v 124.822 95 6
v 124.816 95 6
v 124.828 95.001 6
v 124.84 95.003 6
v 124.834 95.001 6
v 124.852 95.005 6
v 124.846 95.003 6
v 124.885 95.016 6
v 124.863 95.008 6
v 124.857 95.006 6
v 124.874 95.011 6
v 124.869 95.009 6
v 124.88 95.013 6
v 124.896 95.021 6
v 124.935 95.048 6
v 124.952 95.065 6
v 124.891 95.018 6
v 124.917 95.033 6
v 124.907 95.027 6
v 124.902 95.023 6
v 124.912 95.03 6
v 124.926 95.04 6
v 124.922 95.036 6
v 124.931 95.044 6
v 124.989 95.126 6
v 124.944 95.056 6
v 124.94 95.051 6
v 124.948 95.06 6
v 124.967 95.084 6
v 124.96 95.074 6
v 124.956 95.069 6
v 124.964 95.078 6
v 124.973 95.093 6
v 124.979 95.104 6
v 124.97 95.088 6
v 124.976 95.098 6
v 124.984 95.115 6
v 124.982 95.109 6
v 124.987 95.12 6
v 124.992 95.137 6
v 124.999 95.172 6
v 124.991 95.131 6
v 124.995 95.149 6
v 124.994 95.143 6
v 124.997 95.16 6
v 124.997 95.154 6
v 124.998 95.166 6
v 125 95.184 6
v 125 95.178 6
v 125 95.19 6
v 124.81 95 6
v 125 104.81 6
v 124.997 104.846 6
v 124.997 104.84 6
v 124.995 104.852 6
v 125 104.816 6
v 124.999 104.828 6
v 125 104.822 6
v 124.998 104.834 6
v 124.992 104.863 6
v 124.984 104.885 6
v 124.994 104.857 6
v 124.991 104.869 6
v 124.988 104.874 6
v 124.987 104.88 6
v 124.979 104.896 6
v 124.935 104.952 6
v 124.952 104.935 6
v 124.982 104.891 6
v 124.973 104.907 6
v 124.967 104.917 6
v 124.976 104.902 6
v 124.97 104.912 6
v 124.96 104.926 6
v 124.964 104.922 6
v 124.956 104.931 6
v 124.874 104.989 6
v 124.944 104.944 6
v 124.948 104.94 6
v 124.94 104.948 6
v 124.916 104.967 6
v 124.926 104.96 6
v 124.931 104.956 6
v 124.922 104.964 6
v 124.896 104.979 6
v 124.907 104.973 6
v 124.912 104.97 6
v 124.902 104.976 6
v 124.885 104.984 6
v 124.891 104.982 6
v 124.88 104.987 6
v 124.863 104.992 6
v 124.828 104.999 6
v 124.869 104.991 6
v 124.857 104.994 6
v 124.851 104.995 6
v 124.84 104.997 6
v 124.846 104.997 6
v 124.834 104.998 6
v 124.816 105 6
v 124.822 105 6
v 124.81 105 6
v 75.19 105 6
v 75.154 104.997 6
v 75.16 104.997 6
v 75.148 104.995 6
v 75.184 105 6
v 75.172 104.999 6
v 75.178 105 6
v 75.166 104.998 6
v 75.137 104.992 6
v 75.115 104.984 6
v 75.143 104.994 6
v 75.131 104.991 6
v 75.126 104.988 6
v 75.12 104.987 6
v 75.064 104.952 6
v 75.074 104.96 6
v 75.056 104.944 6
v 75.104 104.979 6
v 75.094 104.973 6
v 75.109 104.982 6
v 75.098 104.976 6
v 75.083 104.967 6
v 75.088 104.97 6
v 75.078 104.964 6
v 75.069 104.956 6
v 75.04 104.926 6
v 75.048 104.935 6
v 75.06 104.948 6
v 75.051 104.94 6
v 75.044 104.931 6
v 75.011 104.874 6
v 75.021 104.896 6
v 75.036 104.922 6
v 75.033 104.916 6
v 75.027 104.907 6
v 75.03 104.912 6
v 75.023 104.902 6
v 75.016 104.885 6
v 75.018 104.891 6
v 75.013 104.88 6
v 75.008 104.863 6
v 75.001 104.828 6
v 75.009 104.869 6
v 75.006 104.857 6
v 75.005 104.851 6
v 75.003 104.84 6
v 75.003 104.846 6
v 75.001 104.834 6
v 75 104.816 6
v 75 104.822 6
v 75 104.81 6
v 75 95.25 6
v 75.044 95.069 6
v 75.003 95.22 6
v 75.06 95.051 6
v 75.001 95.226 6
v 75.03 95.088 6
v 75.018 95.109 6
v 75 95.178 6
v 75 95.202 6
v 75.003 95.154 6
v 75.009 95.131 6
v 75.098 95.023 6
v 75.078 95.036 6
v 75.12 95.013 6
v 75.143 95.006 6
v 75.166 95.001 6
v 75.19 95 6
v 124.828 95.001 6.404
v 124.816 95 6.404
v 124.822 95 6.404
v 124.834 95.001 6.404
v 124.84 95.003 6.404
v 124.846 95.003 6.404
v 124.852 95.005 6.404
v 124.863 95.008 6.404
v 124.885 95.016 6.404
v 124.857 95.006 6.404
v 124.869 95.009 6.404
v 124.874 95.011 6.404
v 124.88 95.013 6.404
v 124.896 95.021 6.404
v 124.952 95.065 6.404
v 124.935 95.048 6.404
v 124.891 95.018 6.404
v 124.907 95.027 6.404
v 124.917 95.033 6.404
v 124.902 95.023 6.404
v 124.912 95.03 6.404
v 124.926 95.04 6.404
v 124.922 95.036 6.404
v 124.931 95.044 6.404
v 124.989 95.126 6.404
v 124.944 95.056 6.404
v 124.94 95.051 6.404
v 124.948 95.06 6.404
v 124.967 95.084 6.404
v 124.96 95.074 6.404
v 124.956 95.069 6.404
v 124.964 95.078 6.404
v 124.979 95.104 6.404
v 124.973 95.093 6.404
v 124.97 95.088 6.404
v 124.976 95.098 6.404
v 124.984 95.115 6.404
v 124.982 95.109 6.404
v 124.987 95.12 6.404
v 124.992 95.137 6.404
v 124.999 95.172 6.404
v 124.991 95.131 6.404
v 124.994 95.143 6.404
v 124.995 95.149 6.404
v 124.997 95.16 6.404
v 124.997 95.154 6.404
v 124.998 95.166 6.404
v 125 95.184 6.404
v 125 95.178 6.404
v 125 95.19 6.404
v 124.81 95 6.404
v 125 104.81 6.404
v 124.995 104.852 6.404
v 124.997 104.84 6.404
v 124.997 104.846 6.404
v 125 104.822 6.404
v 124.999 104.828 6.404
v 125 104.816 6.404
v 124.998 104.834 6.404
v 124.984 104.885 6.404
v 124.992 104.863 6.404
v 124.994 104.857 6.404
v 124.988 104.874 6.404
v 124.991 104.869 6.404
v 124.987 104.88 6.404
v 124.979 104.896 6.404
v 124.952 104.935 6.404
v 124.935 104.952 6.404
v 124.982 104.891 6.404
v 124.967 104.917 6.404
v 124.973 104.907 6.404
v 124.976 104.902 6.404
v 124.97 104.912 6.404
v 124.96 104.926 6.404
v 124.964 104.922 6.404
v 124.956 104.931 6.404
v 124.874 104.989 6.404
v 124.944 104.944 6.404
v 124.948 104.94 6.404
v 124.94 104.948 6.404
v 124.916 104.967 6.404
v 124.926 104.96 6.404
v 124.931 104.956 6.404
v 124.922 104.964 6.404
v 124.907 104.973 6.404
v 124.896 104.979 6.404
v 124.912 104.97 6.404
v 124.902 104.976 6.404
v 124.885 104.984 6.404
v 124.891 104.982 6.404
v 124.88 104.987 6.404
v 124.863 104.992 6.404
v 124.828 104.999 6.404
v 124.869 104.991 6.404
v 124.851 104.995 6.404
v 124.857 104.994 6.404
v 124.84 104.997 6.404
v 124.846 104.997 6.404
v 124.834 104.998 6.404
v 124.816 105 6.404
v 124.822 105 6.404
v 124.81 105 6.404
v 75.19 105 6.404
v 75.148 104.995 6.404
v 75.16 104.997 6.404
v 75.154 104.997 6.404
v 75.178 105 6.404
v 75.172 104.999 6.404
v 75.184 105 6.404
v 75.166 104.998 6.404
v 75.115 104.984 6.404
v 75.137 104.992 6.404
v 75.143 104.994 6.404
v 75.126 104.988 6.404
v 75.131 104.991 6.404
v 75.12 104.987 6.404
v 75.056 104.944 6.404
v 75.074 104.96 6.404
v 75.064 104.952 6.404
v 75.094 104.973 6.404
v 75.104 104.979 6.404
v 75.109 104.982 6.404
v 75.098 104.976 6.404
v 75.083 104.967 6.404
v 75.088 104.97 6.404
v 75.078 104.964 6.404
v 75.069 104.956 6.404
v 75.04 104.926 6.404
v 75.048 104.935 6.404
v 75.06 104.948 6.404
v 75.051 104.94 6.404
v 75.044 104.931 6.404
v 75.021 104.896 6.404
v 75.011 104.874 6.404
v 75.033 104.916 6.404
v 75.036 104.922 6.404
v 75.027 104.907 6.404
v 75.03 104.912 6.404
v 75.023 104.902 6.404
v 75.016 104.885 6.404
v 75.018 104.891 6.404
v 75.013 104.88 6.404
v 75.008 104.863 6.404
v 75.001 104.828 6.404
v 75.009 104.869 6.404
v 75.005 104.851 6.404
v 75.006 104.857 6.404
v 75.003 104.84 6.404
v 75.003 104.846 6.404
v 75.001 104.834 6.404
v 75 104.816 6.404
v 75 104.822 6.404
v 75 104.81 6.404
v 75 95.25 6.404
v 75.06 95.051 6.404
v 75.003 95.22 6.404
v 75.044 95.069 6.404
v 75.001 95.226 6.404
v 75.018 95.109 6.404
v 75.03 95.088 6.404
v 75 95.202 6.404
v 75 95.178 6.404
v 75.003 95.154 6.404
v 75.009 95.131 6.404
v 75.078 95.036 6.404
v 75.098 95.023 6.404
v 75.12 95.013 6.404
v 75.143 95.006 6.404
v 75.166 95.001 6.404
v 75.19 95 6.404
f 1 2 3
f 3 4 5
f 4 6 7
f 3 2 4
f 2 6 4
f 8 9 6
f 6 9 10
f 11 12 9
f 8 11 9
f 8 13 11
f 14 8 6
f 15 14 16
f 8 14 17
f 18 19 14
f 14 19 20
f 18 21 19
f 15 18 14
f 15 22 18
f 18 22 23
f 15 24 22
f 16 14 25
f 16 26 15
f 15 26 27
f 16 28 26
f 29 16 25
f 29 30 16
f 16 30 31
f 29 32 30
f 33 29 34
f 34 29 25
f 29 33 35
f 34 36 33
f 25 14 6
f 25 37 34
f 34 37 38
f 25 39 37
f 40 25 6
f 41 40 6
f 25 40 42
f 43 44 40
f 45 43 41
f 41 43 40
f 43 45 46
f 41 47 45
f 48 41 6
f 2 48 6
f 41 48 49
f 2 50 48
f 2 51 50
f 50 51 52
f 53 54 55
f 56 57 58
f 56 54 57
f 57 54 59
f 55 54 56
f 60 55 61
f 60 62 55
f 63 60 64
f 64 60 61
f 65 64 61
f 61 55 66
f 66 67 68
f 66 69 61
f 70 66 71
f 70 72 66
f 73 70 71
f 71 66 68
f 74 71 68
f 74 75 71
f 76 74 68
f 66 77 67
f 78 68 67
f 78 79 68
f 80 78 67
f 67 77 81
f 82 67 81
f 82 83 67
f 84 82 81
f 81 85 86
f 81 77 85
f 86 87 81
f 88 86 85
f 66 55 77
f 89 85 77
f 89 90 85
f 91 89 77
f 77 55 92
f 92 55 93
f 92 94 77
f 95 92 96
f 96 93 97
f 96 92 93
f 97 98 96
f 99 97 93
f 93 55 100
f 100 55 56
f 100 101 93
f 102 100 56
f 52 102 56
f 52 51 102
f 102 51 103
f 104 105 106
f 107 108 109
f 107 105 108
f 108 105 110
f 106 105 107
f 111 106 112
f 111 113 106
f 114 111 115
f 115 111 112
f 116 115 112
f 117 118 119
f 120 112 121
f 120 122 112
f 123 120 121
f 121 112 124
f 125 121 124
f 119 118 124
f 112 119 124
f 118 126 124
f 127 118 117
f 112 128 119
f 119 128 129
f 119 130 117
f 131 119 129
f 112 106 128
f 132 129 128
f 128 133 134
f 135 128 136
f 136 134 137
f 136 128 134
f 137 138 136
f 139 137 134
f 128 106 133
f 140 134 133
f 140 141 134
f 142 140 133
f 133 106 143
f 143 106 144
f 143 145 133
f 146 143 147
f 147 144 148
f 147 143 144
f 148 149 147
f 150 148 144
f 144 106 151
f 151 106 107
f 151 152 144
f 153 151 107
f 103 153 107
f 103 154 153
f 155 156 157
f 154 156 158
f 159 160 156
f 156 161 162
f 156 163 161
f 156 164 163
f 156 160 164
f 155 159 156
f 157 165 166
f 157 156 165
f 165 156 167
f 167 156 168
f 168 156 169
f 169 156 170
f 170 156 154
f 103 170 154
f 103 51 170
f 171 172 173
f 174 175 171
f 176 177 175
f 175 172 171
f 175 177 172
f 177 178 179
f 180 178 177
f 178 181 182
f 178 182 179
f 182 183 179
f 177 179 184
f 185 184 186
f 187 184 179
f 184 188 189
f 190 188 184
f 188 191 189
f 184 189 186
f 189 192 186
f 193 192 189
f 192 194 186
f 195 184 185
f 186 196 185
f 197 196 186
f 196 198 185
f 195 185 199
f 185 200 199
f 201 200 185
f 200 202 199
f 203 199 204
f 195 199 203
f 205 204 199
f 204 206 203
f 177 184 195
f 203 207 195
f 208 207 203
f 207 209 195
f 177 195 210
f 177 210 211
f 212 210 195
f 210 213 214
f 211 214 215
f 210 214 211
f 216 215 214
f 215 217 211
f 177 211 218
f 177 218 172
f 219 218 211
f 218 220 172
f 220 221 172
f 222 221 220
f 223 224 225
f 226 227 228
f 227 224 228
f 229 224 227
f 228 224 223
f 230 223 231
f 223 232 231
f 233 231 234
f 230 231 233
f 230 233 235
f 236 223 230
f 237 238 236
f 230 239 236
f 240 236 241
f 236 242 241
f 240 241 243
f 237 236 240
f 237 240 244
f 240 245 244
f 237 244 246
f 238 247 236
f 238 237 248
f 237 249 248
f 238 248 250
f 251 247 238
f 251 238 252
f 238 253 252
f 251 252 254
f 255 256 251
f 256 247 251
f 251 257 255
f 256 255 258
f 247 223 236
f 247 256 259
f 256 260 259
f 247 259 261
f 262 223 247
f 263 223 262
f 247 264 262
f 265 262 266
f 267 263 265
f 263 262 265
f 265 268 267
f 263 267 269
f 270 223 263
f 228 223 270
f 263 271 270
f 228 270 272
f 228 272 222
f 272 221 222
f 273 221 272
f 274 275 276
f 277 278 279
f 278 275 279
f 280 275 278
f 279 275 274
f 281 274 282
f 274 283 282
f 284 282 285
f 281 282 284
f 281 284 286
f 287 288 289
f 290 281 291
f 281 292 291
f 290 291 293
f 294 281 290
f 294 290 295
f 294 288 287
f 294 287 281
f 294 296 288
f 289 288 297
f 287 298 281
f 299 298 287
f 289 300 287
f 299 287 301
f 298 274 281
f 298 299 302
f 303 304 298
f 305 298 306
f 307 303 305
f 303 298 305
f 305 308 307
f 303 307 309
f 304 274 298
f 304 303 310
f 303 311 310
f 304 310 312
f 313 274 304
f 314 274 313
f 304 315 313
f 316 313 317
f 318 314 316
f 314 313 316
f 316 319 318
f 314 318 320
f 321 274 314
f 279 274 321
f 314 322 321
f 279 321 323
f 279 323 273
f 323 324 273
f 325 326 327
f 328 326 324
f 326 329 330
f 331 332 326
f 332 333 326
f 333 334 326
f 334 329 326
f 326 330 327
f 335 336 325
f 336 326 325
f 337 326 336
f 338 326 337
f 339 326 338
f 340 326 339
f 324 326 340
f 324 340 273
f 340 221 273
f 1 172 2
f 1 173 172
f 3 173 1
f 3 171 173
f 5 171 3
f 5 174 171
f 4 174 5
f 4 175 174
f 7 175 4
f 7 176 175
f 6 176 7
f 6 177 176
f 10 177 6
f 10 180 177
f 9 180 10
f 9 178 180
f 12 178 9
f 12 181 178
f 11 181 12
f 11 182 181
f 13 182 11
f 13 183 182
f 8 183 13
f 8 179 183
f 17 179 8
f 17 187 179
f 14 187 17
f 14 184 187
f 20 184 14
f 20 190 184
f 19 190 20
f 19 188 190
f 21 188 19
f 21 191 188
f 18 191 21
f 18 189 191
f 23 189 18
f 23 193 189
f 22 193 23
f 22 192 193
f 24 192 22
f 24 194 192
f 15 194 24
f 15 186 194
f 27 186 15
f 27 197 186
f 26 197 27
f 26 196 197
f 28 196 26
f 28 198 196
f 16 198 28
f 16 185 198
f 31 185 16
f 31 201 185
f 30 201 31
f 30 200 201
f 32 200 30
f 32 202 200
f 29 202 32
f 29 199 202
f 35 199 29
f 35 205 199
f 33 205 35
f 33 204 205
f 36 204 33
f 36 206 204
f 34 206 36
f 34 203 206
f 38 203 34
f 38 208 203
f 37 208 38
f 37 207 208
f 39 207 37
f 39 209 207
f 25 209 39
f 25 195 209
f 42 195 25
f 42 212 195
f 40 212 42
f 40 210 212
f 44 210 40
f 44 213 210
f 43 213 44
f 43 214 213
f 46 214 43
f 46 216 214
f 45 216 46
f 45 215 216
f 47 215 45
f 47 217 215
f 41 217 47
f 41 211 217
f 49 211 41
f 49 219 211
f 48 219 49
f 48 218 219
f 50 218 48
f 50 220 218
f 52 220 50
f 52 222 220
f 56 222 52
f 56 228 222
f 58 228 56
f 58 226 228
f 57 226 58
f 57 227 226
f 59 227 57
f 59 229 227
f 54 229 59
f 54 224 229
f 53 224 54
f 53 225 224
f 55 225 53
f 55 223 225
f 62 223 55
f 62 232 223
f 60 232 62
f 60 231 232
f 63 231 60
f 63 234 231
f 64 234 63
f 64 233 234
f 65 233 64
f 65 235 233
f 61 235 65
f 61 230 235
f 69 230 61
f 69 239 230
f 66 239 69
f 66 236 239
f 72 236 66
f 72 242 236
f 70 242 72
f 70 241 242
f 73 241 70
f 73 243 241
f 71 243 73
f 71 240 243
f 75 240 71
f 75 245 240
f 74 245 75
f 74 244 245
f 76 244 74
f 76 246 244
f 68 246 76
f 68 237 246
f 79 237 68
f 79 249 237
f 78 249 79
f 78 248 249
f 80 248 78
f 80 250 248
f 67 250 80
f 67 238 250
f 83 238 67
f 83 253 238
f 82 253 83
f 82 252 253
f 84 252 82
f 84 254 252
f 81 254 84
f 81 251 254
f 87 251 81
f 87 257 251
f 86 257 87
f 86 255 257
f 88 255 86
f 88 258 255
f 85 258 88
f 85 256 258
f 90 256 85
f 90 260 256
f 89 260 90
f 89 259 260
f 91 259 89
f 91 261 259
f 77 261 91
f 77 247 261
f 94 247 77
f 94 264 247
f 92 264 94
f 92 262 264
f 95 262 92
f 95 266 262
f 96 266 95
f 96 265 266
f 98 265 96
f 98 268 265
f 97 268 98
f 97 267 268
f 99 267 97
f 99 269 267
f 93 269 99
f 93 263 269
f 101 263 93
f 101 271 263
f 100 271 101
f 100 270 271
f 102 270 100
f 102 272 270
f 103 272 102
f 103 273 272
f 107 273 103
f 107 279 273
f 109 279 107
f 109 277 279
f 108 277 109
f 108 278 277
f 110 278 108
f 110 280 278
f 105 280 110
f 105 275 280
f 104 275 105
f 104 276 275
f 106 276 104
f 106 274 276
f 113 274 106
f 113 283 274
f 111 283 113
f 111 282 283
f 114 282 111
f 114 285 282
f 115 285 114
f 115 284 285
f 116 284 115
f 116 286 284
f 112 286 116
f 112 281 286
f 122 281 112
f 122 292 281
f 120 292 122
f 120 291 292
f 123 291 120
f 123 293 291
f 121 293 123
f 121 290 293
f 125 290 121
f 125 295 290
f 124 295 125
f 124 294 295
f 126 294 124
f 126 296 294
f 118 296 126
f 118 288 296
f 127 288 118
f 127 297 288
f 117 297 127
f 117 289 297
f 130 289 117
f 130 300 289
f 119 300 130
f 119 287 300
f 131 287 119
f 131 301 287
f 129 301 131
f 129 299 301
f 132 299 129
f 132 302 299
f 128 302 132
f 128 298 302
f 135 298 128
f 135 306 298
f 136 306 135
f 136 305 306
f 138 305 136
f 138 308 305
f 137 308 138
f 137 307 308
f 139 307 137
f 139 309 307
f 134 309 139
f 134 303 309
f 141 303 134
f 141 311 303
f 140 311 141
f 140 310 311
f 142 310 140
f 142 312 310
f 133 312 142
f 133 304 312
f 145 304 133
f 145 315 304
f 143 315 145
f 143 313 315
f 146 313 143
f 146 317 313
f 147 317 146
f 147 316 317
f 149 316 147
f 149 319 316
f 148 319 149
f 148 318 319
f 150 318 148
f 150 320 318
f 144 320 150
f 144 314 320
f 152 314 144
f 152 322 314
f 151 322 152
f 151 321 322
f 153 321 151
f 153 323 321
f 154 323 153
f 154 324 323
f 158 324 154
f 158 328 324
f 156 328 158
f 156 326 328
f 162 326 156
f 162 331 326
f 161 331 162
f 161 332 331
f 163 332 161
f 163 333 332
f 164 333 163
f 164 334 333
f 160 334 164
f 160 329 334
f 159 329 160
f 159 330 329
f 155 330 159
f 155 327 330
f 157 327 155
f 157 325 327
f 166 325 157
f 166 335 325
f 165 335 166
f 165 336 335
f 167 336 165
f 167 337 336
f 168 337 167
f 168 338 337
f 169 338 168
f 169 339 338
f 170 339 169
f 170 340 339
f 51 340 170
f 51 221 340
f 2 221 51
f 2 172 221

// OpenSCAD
module drawBasicShape(x1, y1, x2, y2, width)
{
	length = sqrt((x1-x2)*(x1-x2) + (y1-y2)*(y1-y2));
	if (width!=0.0) {
		square(size = [width, length], center = false);
		translate([width/2.0, 0, 0]) circle(d=width);
		translate([width/2.0, length, 0]) circle(d=width);
	}
}

module translateAndRotate(x1, y1, x2, y2, width)
{
	if (width != 0.0) {
		angle = atan((y2-y1)/(x2-x1)) +270;
		if (x2>=x1) {
			translate([x1, y1, 0.0]) rotate([0.0, 0.0, angle]) translate([-width/2.0, 0.0, 0.0]) scale([1.0, 1.0, 1.0]) drawBasicShape(x1, y1, x2, y2, width);
		}
		else {
			translate([x1, y1, 0.0]) rotate([0.0, 0.0, angle+180]) translate([-width/2.0, 0.0, 0.0]) scale([1.0, 1.0, 1.0]) drawBasicShape(x1, y1, x2, y2, width);		}
	}
}

$fn=50;

points14 = [
[75.77800000, 95.77800000, 0.00000000],
[124.22200000, 95.77800000, 0.37999672],
[124.22200000, 104.22200000, 0.37997788],
[75.77800000, 104.22200000, 0.37999548],
[75.77800000, 95.83800000, 0.37998140],
[75.48400000, 95.48400000, 0.00000000],
[124.51600000, 95.48400000, 0.37999746],
[124.51600000, 104.51600000, 0.37998977],
[75.48400000, 104.51600000, 0.37999868],
[75.48400000, 95.54400000, 0.37998644],
[75.19000000, 95.19000000, 0.00000000],
[124.81000000, 95.19000000, 0.38000060],
[124.81000000, 104.81000000, 0.38000021],
[75.19000000, 104.81000000, 0.37999939],
[75.19000000, 95.25000000, 0.38000344],
[75.53600000, 95.39000000, 0.00000000],
[75.94600000, 103.88900000, 0.00000000],
[76.11100000, 104.05400000, 0.37935605],
[76.52800000, 104.05400000, 0.38015610],
[75.94600000, 103.47200000, 0.37989934],
[75.94600000, 103.05500000, 0.38001190],
[76.94500000, 104.05400000, 0.37994651],
[77.36200000, 104.05400000, 0.38015610],
[75.94600000, 102.63800000, 0.37996589],
[75.94600000, 102.22100000, 0.38015610],
[77.77900000, 104.05400000, 0.37999966],
[78.19600000, 104.05400000, 0.38001190],
[75.94600000, 101.80400000, 0.38000201],
[75.94600000, 101.38700000, 0.38015610],
[78.61300000, 104.05400000, 0.38000362],
[79.03000000, 104.05400000, 0.38001190],
[75.94600000, 100.97000000, 0.38003238],
[75.94600000, 100.55300000, 0.38001190],
[79.44700000, 104.05400000, 0.38001785],
[79.86400000, 104.05400000, 0.38001190],
[75.94600000, 100.13600000, 0.38002811],
[75.94600000, 99.71900000, 0.38001190],
[80.28100000, 104.05400000, 0.38002660],
[80.69800000, 104.05400000, 0.38015610],
[75.94600000, 99.30200000, 0.38002534],
[75.94600000, 98.88500000, 0.38001190],
[81.11500000, 104.05400000, 0.38003252],
[81.53300000, 104.05400000, 0.37930814],
[75.94600000, 98.46700000, 0.37997836],
[75.94600000, 98.05000000, 0.38001190],
[81.95000000, 104.05400000, 0.37998780],
[82.36700000, 104.05400000, 0.38001190],
[75.94600000, 97.63300000, 0.37998939],
[75.94600000, 97.21600000, 0.38001190],
[82.78400000, 104.05400000, 0.37999079],
[83.20100000, 104.05400000, 0.38001190],
[75.94600000, 96.79900000, 0.37999789],
[75.94600000, 96.38200000, 0.38001190],
[83.61800000, 104.05400000, 0.37999314],
[84.03500000, 104.05400000, 0.38015610],
[75.95600000, 95.97600000, 0.37999749],
[76.34400000, 95.94600000, 0.37973456],
[84.45200000, 104.05400000, 0.38000229],
[84.86900000, 104.05400000, 0.38001190],
[76.76100000, 95.94600000, 0.38000754],
[77.17800000, 95.94600000, 0.38001190],
[85.28600000, 104.05400000, 0.38000229],
[85.70300000, 104.05400000, 0.38001190],
[77.59500000, 95.94600000, 0.38000754],
[78.01200000, 95.94600000, 0.38001190],
[86.12000000, 104.05400000, 0.38000229],
[86.53700000, 104.05400000, 0.38015610],
[78.42900000, 95.94600000, 0.38000229],
[78.84600000, 95.94600000, 0.38001190],
[86.95400000, 104.05400000, 0.38000754],
[87.37100000, 104.05400000, 0.38001190],
[79.26300000, 95.94600000, 0.38000229],
[79.68000000, 95.94600000, 0.38001190],
[87.78900000, 104.05400000, 0.37998940],
[88.20600000, 104.05400000, 0.38001190],
[80.09700000, 95.94600000, 0.37998415],
[80.51500000, 95.94600000, 0.37945200],
[88.62300000, 104.05400000, 0.38000229],
[89.04000000, 104.05400000, 0.38001190],
[80.93200000, 95.94600000, 0.38000754],
[81.34900000, 95.94600000, 0.38001190],
[89.45700000, 104.05400000, 0.38000229],
[89.87400000, 104.05400000, 0.38001190],
[81.76600000, 95.94600000, 0.38000754],
[82.18300000, 95.94600000, 0.38001190],
[90.29100000, 104.05400000, 0.38000229],
[90.70800000, 104.05400000, 0.38015610],
[82.60000000, 95.94600000, 0.38000229],
[83.01700000, 95.94600000, 0.38001190],
[91.12500000, 104.05400000, 0.38000229],
[91.54200000, 104.05400000, 0.38015610],
[83.43400000, 95.94600000, 0.38000229],
[83.85100000, 95.94600000, 0.38001190],
[91.95900000, 104.05400000, 0.38000754],
[92.37600000, 104.05400000, 0.38001190],
[84.26800000, 95.94600000, 0.38000229],
[84.68500000, 95.94600000, 0.38001190],
[92.79300000, 104.05400000, 0.38000754],
[93.21000000, 104.05400000, 0.38001190],
[85.10200000, 95.94600000, 0.38000229],
[85.51900000, 95.94600000, 0.38015610],
[93.62700000, 104.05400000, 0.38000229],
[94.04400000, 104.05400000, 0.38001190],
[85.93600000, 95.94600000, 0.38000754],
[86.35300000, 95.94600000, 0.38001190],
[94.46200000, 104.05400000, 0.37998415],
[94.87900000, 104.05400000, 0.38001190],
[86.77000000, 95.94600000, 0.37998940],
[87.18800000, 95.94600000, 0.37930814],
[95.29600000, 104.05400000, 0.38000229],
[95.71300000, 104.05400000, 0.38015610],
[87.60500000, 95.94600000, 0.38000229],
[88.02200000, 95.94600000, 0.38001190],
[96.13000000, 104.05400000, 0.38000754],
[96.54700000, 104.05400000, 0.38001190],
[88.43900000, 95.94600000, 0.38000229],
[88.85600000, 95.94600000, 0.38001190],
[96.96400000, 104.05400000, 0.38000754],
[97.38100000, 104.05400000, 0.38001190],
[89.27300000, 95.94600000, 0.38000229],
[89.69000000, 95.94600000, 0.38015610],
[97.79800000, 104.05400000, 0.38000229],
[98.21500000, 104.05400000, 0.38001190],
[90.10700000, 95.94600000, 0.38000754],
[90.52400000, 95.94600000, 0.38001190],
[98.63200000, 104.05400000, 0.38000229],
[99.04900000, 104.05400000, 0.38001190],
[90.94100000, 95.94600000, 0.38000754],
[91.35800000, 95.94600000, 0.38001190],
[99.46600000, 104.05400000, 0.38000229],
[99.88300000, 104.05400000, 0.38015610],
[91.77500000, 95.94600000, 0.38000229],
[92.19200000, 95.94600000, 0.38001190],
[100.30000000, 104.05400000, 0.38000754],
[100.71800000, 104.05400000, 0.37930814],
[92.60900000, 95.94600000, 0.37998415],
[93.02600000, 95.94600000, 0.38001190],
[101.13500000, 104.05400000, 0.37998940],
[101.55200000, 104.05400000, 0.38001190],
[93.44400000, 95.94600000, 0.38000229],
[93.86100000, 95.94600000, 0.38015610],
[101.96900000, 104.05400000, 0.38000229],
[102.38600000, 104.05400000, 0.38001190],
[94.27800000, 95.94600000, 0.38000754],
[94.69500000, 95.94600000, 0.38001190],
[102.80300000, 104.05400000, 0.38000229],
[103.22000000, 104.05400000, 0.38001190],
[95.11200000, 95.94600000, 0.38000754],
[95.52900000, 95.94600000, 0.38001190],
[103.63700000, 104.05400000, 0.38000229],
[104.05400000, 104.05400000, 0.38015610],
[95.94600000, 95.94600000, 0.38000229],
[96.36300000, 95.94600000, 0.38001190],
[104.47100000, 104.05400000, 0.38000754],
[104.88800000, 104.05400000, 0.38001190],
[96.78000000, 95.94600000, 0.38000229],
[97.19700000, 95.94600000, 0.38001190],
[105.30500000, 104.05400000, 0.38000754],
[105.72200000, 104.05400000, 0.38001190],
[97.61400000, 95.94600000, 0.38000229],
[98.03100000, 95.94600000, 0.38015610],
[106.13900000, 104.05400000, 0.38000229],
[106.55600000, 104.05400000, 0.38001190],
[98.44800000, 95.94600000, 0.38000229],
[98.86500000, 95.94600000, 0.38015610],
[106.97300000, 104.05400000, 0.38000229],
[107.39100000, 104.05400000, 0.37930814],
[99.28200000, 95.94600000, 0.37998940],
[99.69900000, 95.94600000, 0.38001190],
[107.80800000, 104.05400000, 0.37998415],
[108.22500000, 104.05400000, 0.38001190],
[100.11700000, 95.94600000, 0.38000754],
[100.53400000, 95.94600000, 0.38001190],
[108.64200000, 104.05400000, 0.38000229],
[109.05900000, 104.05400000, 0.38015610],
[100.95100000, 95.94600000, 0.38000229],
[101.36800000, 95.94600000, 0.38001190],
[109.47600000, 104.05400000, 0.38000754],
[109.89300000, 104.05400000, 0.38001190],
[101.78500000, 95.94600000, 0.38000229],
[102.20200000, 95.94600000, 0.38001190],
[110.31000000, 104.05400000, 0.38000754],
[110.72700000, 104.05400000, 0.38001190],
[102.61900000, 95.94600000, 0.38000229],
[103.03600000, 95.94600000, 0.38015610],
[111.14400000, 104.05400000, 0.38000229],
[111.56100000, 104.05400000, 0.38001190],
[103.45300000, 95.94600000, 0.38000754],
[103.87000000, 95.94600000, 0.38001190],
[111.97800000, 104.05400000, 0.38000229],
[112.39500000, 104.05400000, 0.38001190],
[104.28700000, 95.94600000, 0.38000754],
[104.70400000, 95.94600000, 0.38001190],
[112.81200000, 104.05400000, 0.38000229],
[113.22900000, 104.05400000, 0.38015610],
[105.12100000, 95.94600000, 0.38000229],
[105.53800000, 95.94600000, 0.38001190],
[113.64700000, 104.05400000, 0.37998940],
[114.06400000, 104.05400000, 0.38001190],
[105.95500000, 95.94600000, 0.37998415],
[106.37300000, 95.94600000, 0.37930814],
[114.48100000, 104.05400000, 0.38000754],
[114.89800000, 104.05400000, 0.38001190],
[106.79000000, 95.94600000, 0.38000229],
[107.20700000, 95.94600000, 0.38015610],
[115.31500000, 104.05400000, 0.38000229],
[115.73200000, 104.05400000, 0.38001190],
[107.62400000, 95.94600000, 0.38000754],
[108.04100000, 95.94600000, 0.38001190],
[116.14900000, 104.05400000, 0.38000229],
[116.56600000, 104.05400000, 0.38001190],
[108.45800000, 95.94600000, 0.38000754],
[108.87500000, 95.94600000, 0.38001190],
[116.98300000, 104.05400000, 0.38000229],
[117.40000000, 104.05400000, 0.38015610],
[109.29200000, 95.94600000, 0.38000229],
[109.70900000, 95.94600000, 0.38001190],
[117.81700000, 104.05400000, 0.38000754],
[118.23400000, 104.05400000, 0.38001190],
[110.12600000, 95.94600000, 0.38000229],
[110.54300000, 95.94600000, 0.38001190],
[118.65100000, 104.05400000, 0.38000754],
[119.06800000, 104.05400000, 0.38001190],
[110.96000000, 95.94600000, 0.38000229],
[111.37700000, 95.94600000, 0.38015610],
[119.48500000, 104.05400000, 0.38000229],
[119.90200000, 104.05400000, 0.38001190],
[111.79400000, 95.94600000, 0.38000229],
[112.21100000, 95.94600000, 0.38015610],
[120.32000000, 104.05400000, 0.37998415],
[120.73700000, 104.05400000, 0.38001190],
[112.62900000, 95.94600000, 0.38000754],
[113.04600000, 95.94600000, 0.38001190],
[121.15400000, 104.05400000, 0.38000229],
[121.57100000, 104.05400000, 0.38001190],
[113.46300000, 95.94600000, 0.38000754],
[113.88000000, 95.94600000, 0.38001190],
[121.98800000, 104.05400000, 0.38000229],
[122.40500000, 104.05400000, 0.38015610],
[114.29700000, 95.94600000, 0.38000229],
[114.71400000, 95.94600000, 0.38001190],
[122.82200000, 104.05400000, 0.38000754],
[123.23900000, 104.05400000, 0.38001190],
[115.13100000, 95.94600000, 0.38000229],
[115.54800000, 95.94600000, 0.38001190],
[123.65600000, 104.05400000, 0.38000754],
[124.04400000, 104.02500000, 0.37963728],
[115.96500000, 95.94600000, 0.37998455],
[116.38200000, 95.94600000, 0.38001190],
[124.05400000, 103.61800000, 0.37999868],
[124.05400000, 103.20100000, 0.38001190],
[116.79900000, 95.94600000, 0.37999789],
[117.21600000, 95.94600000, 0.38001190],
[124.05400000, 102.78400000, 0.37999701],
[124.05400000, 102.36700000, 0.38001190],
[117.63300000, 95.94600000, 0.37998939],
[118.05000000, 95.94600000, 0.38001190],
[124.05400000, 101.95000000, 0.37998780],
[124.05400000, 101.53300000, 0.38001190],
[118.46700000, 95.94600000, 0.37998597],
[118.88400000, 95.94600000, 0.38001190],
[124.05400000, 101.11600000, 0.37997562],
[124.05400000, 100.69800000, 0.37930814],
[119.30200000, 95.94600000, 0.38003429],
[119.71900000, 95.94600000, 0.38001190],
[124.05400000, 100.28100000, 0.38002660],
[124.05400000, 99.86400000, 0.38015610],
[120.13600000, 95.94600000, 0.38002811],
[120.55300000, 95.94600000, 0.38001190],
[124.05400000, 99.44700000, 0.38002999],
[124.05400000, 99.03000000, 0.38001190],
[120.97000000, 95.94600000, 0.38001859],
[121.38700000, 95.94600000, 0.38015610],
[124.05400000, 98.61300000, 0.38001957],
[124.05400000, 98.19600000, 0.38001190],
[121.80400000, 95.94600000, 0.38002091],
[122.22100000, 95.94600000, 0.38001190],
[124.05400000, 97.77900000, 0.37999966],
[124.05400000, 97.36200000, 0.38015610],
[122.63800000, 95.94600000, 0.37999592],
[123.05500000, 95.94600000, 0.38001190],
[124.05400000, 96.94500000, 0.37998907],
[124.05400000, 96.52800000, 0.38001190],
[123.47200000, 95.94600000, 0.37989934],
[123.88900000, 95.94600000, 0.38015610],
[124.05400000, 96.11100000, 0.37961375],
];

translate([0.0, 0.0, 6.00000000]) {
	linear_extrude(height = 0.40400000, center = false, convexity = 10, twist = 0) {
		union() {
			for( i=[0:len(points14)-2] ){ 
				x1 = points14[i][0];
				y1 = points14[i][1];
				x2 = points14[i+1][0];
				y2 = points14[i+1][1];
				width = points14[i+1][2];
				translateAndRotate(x1, y1, x2, y2, width);
			}
		}
	}
}
